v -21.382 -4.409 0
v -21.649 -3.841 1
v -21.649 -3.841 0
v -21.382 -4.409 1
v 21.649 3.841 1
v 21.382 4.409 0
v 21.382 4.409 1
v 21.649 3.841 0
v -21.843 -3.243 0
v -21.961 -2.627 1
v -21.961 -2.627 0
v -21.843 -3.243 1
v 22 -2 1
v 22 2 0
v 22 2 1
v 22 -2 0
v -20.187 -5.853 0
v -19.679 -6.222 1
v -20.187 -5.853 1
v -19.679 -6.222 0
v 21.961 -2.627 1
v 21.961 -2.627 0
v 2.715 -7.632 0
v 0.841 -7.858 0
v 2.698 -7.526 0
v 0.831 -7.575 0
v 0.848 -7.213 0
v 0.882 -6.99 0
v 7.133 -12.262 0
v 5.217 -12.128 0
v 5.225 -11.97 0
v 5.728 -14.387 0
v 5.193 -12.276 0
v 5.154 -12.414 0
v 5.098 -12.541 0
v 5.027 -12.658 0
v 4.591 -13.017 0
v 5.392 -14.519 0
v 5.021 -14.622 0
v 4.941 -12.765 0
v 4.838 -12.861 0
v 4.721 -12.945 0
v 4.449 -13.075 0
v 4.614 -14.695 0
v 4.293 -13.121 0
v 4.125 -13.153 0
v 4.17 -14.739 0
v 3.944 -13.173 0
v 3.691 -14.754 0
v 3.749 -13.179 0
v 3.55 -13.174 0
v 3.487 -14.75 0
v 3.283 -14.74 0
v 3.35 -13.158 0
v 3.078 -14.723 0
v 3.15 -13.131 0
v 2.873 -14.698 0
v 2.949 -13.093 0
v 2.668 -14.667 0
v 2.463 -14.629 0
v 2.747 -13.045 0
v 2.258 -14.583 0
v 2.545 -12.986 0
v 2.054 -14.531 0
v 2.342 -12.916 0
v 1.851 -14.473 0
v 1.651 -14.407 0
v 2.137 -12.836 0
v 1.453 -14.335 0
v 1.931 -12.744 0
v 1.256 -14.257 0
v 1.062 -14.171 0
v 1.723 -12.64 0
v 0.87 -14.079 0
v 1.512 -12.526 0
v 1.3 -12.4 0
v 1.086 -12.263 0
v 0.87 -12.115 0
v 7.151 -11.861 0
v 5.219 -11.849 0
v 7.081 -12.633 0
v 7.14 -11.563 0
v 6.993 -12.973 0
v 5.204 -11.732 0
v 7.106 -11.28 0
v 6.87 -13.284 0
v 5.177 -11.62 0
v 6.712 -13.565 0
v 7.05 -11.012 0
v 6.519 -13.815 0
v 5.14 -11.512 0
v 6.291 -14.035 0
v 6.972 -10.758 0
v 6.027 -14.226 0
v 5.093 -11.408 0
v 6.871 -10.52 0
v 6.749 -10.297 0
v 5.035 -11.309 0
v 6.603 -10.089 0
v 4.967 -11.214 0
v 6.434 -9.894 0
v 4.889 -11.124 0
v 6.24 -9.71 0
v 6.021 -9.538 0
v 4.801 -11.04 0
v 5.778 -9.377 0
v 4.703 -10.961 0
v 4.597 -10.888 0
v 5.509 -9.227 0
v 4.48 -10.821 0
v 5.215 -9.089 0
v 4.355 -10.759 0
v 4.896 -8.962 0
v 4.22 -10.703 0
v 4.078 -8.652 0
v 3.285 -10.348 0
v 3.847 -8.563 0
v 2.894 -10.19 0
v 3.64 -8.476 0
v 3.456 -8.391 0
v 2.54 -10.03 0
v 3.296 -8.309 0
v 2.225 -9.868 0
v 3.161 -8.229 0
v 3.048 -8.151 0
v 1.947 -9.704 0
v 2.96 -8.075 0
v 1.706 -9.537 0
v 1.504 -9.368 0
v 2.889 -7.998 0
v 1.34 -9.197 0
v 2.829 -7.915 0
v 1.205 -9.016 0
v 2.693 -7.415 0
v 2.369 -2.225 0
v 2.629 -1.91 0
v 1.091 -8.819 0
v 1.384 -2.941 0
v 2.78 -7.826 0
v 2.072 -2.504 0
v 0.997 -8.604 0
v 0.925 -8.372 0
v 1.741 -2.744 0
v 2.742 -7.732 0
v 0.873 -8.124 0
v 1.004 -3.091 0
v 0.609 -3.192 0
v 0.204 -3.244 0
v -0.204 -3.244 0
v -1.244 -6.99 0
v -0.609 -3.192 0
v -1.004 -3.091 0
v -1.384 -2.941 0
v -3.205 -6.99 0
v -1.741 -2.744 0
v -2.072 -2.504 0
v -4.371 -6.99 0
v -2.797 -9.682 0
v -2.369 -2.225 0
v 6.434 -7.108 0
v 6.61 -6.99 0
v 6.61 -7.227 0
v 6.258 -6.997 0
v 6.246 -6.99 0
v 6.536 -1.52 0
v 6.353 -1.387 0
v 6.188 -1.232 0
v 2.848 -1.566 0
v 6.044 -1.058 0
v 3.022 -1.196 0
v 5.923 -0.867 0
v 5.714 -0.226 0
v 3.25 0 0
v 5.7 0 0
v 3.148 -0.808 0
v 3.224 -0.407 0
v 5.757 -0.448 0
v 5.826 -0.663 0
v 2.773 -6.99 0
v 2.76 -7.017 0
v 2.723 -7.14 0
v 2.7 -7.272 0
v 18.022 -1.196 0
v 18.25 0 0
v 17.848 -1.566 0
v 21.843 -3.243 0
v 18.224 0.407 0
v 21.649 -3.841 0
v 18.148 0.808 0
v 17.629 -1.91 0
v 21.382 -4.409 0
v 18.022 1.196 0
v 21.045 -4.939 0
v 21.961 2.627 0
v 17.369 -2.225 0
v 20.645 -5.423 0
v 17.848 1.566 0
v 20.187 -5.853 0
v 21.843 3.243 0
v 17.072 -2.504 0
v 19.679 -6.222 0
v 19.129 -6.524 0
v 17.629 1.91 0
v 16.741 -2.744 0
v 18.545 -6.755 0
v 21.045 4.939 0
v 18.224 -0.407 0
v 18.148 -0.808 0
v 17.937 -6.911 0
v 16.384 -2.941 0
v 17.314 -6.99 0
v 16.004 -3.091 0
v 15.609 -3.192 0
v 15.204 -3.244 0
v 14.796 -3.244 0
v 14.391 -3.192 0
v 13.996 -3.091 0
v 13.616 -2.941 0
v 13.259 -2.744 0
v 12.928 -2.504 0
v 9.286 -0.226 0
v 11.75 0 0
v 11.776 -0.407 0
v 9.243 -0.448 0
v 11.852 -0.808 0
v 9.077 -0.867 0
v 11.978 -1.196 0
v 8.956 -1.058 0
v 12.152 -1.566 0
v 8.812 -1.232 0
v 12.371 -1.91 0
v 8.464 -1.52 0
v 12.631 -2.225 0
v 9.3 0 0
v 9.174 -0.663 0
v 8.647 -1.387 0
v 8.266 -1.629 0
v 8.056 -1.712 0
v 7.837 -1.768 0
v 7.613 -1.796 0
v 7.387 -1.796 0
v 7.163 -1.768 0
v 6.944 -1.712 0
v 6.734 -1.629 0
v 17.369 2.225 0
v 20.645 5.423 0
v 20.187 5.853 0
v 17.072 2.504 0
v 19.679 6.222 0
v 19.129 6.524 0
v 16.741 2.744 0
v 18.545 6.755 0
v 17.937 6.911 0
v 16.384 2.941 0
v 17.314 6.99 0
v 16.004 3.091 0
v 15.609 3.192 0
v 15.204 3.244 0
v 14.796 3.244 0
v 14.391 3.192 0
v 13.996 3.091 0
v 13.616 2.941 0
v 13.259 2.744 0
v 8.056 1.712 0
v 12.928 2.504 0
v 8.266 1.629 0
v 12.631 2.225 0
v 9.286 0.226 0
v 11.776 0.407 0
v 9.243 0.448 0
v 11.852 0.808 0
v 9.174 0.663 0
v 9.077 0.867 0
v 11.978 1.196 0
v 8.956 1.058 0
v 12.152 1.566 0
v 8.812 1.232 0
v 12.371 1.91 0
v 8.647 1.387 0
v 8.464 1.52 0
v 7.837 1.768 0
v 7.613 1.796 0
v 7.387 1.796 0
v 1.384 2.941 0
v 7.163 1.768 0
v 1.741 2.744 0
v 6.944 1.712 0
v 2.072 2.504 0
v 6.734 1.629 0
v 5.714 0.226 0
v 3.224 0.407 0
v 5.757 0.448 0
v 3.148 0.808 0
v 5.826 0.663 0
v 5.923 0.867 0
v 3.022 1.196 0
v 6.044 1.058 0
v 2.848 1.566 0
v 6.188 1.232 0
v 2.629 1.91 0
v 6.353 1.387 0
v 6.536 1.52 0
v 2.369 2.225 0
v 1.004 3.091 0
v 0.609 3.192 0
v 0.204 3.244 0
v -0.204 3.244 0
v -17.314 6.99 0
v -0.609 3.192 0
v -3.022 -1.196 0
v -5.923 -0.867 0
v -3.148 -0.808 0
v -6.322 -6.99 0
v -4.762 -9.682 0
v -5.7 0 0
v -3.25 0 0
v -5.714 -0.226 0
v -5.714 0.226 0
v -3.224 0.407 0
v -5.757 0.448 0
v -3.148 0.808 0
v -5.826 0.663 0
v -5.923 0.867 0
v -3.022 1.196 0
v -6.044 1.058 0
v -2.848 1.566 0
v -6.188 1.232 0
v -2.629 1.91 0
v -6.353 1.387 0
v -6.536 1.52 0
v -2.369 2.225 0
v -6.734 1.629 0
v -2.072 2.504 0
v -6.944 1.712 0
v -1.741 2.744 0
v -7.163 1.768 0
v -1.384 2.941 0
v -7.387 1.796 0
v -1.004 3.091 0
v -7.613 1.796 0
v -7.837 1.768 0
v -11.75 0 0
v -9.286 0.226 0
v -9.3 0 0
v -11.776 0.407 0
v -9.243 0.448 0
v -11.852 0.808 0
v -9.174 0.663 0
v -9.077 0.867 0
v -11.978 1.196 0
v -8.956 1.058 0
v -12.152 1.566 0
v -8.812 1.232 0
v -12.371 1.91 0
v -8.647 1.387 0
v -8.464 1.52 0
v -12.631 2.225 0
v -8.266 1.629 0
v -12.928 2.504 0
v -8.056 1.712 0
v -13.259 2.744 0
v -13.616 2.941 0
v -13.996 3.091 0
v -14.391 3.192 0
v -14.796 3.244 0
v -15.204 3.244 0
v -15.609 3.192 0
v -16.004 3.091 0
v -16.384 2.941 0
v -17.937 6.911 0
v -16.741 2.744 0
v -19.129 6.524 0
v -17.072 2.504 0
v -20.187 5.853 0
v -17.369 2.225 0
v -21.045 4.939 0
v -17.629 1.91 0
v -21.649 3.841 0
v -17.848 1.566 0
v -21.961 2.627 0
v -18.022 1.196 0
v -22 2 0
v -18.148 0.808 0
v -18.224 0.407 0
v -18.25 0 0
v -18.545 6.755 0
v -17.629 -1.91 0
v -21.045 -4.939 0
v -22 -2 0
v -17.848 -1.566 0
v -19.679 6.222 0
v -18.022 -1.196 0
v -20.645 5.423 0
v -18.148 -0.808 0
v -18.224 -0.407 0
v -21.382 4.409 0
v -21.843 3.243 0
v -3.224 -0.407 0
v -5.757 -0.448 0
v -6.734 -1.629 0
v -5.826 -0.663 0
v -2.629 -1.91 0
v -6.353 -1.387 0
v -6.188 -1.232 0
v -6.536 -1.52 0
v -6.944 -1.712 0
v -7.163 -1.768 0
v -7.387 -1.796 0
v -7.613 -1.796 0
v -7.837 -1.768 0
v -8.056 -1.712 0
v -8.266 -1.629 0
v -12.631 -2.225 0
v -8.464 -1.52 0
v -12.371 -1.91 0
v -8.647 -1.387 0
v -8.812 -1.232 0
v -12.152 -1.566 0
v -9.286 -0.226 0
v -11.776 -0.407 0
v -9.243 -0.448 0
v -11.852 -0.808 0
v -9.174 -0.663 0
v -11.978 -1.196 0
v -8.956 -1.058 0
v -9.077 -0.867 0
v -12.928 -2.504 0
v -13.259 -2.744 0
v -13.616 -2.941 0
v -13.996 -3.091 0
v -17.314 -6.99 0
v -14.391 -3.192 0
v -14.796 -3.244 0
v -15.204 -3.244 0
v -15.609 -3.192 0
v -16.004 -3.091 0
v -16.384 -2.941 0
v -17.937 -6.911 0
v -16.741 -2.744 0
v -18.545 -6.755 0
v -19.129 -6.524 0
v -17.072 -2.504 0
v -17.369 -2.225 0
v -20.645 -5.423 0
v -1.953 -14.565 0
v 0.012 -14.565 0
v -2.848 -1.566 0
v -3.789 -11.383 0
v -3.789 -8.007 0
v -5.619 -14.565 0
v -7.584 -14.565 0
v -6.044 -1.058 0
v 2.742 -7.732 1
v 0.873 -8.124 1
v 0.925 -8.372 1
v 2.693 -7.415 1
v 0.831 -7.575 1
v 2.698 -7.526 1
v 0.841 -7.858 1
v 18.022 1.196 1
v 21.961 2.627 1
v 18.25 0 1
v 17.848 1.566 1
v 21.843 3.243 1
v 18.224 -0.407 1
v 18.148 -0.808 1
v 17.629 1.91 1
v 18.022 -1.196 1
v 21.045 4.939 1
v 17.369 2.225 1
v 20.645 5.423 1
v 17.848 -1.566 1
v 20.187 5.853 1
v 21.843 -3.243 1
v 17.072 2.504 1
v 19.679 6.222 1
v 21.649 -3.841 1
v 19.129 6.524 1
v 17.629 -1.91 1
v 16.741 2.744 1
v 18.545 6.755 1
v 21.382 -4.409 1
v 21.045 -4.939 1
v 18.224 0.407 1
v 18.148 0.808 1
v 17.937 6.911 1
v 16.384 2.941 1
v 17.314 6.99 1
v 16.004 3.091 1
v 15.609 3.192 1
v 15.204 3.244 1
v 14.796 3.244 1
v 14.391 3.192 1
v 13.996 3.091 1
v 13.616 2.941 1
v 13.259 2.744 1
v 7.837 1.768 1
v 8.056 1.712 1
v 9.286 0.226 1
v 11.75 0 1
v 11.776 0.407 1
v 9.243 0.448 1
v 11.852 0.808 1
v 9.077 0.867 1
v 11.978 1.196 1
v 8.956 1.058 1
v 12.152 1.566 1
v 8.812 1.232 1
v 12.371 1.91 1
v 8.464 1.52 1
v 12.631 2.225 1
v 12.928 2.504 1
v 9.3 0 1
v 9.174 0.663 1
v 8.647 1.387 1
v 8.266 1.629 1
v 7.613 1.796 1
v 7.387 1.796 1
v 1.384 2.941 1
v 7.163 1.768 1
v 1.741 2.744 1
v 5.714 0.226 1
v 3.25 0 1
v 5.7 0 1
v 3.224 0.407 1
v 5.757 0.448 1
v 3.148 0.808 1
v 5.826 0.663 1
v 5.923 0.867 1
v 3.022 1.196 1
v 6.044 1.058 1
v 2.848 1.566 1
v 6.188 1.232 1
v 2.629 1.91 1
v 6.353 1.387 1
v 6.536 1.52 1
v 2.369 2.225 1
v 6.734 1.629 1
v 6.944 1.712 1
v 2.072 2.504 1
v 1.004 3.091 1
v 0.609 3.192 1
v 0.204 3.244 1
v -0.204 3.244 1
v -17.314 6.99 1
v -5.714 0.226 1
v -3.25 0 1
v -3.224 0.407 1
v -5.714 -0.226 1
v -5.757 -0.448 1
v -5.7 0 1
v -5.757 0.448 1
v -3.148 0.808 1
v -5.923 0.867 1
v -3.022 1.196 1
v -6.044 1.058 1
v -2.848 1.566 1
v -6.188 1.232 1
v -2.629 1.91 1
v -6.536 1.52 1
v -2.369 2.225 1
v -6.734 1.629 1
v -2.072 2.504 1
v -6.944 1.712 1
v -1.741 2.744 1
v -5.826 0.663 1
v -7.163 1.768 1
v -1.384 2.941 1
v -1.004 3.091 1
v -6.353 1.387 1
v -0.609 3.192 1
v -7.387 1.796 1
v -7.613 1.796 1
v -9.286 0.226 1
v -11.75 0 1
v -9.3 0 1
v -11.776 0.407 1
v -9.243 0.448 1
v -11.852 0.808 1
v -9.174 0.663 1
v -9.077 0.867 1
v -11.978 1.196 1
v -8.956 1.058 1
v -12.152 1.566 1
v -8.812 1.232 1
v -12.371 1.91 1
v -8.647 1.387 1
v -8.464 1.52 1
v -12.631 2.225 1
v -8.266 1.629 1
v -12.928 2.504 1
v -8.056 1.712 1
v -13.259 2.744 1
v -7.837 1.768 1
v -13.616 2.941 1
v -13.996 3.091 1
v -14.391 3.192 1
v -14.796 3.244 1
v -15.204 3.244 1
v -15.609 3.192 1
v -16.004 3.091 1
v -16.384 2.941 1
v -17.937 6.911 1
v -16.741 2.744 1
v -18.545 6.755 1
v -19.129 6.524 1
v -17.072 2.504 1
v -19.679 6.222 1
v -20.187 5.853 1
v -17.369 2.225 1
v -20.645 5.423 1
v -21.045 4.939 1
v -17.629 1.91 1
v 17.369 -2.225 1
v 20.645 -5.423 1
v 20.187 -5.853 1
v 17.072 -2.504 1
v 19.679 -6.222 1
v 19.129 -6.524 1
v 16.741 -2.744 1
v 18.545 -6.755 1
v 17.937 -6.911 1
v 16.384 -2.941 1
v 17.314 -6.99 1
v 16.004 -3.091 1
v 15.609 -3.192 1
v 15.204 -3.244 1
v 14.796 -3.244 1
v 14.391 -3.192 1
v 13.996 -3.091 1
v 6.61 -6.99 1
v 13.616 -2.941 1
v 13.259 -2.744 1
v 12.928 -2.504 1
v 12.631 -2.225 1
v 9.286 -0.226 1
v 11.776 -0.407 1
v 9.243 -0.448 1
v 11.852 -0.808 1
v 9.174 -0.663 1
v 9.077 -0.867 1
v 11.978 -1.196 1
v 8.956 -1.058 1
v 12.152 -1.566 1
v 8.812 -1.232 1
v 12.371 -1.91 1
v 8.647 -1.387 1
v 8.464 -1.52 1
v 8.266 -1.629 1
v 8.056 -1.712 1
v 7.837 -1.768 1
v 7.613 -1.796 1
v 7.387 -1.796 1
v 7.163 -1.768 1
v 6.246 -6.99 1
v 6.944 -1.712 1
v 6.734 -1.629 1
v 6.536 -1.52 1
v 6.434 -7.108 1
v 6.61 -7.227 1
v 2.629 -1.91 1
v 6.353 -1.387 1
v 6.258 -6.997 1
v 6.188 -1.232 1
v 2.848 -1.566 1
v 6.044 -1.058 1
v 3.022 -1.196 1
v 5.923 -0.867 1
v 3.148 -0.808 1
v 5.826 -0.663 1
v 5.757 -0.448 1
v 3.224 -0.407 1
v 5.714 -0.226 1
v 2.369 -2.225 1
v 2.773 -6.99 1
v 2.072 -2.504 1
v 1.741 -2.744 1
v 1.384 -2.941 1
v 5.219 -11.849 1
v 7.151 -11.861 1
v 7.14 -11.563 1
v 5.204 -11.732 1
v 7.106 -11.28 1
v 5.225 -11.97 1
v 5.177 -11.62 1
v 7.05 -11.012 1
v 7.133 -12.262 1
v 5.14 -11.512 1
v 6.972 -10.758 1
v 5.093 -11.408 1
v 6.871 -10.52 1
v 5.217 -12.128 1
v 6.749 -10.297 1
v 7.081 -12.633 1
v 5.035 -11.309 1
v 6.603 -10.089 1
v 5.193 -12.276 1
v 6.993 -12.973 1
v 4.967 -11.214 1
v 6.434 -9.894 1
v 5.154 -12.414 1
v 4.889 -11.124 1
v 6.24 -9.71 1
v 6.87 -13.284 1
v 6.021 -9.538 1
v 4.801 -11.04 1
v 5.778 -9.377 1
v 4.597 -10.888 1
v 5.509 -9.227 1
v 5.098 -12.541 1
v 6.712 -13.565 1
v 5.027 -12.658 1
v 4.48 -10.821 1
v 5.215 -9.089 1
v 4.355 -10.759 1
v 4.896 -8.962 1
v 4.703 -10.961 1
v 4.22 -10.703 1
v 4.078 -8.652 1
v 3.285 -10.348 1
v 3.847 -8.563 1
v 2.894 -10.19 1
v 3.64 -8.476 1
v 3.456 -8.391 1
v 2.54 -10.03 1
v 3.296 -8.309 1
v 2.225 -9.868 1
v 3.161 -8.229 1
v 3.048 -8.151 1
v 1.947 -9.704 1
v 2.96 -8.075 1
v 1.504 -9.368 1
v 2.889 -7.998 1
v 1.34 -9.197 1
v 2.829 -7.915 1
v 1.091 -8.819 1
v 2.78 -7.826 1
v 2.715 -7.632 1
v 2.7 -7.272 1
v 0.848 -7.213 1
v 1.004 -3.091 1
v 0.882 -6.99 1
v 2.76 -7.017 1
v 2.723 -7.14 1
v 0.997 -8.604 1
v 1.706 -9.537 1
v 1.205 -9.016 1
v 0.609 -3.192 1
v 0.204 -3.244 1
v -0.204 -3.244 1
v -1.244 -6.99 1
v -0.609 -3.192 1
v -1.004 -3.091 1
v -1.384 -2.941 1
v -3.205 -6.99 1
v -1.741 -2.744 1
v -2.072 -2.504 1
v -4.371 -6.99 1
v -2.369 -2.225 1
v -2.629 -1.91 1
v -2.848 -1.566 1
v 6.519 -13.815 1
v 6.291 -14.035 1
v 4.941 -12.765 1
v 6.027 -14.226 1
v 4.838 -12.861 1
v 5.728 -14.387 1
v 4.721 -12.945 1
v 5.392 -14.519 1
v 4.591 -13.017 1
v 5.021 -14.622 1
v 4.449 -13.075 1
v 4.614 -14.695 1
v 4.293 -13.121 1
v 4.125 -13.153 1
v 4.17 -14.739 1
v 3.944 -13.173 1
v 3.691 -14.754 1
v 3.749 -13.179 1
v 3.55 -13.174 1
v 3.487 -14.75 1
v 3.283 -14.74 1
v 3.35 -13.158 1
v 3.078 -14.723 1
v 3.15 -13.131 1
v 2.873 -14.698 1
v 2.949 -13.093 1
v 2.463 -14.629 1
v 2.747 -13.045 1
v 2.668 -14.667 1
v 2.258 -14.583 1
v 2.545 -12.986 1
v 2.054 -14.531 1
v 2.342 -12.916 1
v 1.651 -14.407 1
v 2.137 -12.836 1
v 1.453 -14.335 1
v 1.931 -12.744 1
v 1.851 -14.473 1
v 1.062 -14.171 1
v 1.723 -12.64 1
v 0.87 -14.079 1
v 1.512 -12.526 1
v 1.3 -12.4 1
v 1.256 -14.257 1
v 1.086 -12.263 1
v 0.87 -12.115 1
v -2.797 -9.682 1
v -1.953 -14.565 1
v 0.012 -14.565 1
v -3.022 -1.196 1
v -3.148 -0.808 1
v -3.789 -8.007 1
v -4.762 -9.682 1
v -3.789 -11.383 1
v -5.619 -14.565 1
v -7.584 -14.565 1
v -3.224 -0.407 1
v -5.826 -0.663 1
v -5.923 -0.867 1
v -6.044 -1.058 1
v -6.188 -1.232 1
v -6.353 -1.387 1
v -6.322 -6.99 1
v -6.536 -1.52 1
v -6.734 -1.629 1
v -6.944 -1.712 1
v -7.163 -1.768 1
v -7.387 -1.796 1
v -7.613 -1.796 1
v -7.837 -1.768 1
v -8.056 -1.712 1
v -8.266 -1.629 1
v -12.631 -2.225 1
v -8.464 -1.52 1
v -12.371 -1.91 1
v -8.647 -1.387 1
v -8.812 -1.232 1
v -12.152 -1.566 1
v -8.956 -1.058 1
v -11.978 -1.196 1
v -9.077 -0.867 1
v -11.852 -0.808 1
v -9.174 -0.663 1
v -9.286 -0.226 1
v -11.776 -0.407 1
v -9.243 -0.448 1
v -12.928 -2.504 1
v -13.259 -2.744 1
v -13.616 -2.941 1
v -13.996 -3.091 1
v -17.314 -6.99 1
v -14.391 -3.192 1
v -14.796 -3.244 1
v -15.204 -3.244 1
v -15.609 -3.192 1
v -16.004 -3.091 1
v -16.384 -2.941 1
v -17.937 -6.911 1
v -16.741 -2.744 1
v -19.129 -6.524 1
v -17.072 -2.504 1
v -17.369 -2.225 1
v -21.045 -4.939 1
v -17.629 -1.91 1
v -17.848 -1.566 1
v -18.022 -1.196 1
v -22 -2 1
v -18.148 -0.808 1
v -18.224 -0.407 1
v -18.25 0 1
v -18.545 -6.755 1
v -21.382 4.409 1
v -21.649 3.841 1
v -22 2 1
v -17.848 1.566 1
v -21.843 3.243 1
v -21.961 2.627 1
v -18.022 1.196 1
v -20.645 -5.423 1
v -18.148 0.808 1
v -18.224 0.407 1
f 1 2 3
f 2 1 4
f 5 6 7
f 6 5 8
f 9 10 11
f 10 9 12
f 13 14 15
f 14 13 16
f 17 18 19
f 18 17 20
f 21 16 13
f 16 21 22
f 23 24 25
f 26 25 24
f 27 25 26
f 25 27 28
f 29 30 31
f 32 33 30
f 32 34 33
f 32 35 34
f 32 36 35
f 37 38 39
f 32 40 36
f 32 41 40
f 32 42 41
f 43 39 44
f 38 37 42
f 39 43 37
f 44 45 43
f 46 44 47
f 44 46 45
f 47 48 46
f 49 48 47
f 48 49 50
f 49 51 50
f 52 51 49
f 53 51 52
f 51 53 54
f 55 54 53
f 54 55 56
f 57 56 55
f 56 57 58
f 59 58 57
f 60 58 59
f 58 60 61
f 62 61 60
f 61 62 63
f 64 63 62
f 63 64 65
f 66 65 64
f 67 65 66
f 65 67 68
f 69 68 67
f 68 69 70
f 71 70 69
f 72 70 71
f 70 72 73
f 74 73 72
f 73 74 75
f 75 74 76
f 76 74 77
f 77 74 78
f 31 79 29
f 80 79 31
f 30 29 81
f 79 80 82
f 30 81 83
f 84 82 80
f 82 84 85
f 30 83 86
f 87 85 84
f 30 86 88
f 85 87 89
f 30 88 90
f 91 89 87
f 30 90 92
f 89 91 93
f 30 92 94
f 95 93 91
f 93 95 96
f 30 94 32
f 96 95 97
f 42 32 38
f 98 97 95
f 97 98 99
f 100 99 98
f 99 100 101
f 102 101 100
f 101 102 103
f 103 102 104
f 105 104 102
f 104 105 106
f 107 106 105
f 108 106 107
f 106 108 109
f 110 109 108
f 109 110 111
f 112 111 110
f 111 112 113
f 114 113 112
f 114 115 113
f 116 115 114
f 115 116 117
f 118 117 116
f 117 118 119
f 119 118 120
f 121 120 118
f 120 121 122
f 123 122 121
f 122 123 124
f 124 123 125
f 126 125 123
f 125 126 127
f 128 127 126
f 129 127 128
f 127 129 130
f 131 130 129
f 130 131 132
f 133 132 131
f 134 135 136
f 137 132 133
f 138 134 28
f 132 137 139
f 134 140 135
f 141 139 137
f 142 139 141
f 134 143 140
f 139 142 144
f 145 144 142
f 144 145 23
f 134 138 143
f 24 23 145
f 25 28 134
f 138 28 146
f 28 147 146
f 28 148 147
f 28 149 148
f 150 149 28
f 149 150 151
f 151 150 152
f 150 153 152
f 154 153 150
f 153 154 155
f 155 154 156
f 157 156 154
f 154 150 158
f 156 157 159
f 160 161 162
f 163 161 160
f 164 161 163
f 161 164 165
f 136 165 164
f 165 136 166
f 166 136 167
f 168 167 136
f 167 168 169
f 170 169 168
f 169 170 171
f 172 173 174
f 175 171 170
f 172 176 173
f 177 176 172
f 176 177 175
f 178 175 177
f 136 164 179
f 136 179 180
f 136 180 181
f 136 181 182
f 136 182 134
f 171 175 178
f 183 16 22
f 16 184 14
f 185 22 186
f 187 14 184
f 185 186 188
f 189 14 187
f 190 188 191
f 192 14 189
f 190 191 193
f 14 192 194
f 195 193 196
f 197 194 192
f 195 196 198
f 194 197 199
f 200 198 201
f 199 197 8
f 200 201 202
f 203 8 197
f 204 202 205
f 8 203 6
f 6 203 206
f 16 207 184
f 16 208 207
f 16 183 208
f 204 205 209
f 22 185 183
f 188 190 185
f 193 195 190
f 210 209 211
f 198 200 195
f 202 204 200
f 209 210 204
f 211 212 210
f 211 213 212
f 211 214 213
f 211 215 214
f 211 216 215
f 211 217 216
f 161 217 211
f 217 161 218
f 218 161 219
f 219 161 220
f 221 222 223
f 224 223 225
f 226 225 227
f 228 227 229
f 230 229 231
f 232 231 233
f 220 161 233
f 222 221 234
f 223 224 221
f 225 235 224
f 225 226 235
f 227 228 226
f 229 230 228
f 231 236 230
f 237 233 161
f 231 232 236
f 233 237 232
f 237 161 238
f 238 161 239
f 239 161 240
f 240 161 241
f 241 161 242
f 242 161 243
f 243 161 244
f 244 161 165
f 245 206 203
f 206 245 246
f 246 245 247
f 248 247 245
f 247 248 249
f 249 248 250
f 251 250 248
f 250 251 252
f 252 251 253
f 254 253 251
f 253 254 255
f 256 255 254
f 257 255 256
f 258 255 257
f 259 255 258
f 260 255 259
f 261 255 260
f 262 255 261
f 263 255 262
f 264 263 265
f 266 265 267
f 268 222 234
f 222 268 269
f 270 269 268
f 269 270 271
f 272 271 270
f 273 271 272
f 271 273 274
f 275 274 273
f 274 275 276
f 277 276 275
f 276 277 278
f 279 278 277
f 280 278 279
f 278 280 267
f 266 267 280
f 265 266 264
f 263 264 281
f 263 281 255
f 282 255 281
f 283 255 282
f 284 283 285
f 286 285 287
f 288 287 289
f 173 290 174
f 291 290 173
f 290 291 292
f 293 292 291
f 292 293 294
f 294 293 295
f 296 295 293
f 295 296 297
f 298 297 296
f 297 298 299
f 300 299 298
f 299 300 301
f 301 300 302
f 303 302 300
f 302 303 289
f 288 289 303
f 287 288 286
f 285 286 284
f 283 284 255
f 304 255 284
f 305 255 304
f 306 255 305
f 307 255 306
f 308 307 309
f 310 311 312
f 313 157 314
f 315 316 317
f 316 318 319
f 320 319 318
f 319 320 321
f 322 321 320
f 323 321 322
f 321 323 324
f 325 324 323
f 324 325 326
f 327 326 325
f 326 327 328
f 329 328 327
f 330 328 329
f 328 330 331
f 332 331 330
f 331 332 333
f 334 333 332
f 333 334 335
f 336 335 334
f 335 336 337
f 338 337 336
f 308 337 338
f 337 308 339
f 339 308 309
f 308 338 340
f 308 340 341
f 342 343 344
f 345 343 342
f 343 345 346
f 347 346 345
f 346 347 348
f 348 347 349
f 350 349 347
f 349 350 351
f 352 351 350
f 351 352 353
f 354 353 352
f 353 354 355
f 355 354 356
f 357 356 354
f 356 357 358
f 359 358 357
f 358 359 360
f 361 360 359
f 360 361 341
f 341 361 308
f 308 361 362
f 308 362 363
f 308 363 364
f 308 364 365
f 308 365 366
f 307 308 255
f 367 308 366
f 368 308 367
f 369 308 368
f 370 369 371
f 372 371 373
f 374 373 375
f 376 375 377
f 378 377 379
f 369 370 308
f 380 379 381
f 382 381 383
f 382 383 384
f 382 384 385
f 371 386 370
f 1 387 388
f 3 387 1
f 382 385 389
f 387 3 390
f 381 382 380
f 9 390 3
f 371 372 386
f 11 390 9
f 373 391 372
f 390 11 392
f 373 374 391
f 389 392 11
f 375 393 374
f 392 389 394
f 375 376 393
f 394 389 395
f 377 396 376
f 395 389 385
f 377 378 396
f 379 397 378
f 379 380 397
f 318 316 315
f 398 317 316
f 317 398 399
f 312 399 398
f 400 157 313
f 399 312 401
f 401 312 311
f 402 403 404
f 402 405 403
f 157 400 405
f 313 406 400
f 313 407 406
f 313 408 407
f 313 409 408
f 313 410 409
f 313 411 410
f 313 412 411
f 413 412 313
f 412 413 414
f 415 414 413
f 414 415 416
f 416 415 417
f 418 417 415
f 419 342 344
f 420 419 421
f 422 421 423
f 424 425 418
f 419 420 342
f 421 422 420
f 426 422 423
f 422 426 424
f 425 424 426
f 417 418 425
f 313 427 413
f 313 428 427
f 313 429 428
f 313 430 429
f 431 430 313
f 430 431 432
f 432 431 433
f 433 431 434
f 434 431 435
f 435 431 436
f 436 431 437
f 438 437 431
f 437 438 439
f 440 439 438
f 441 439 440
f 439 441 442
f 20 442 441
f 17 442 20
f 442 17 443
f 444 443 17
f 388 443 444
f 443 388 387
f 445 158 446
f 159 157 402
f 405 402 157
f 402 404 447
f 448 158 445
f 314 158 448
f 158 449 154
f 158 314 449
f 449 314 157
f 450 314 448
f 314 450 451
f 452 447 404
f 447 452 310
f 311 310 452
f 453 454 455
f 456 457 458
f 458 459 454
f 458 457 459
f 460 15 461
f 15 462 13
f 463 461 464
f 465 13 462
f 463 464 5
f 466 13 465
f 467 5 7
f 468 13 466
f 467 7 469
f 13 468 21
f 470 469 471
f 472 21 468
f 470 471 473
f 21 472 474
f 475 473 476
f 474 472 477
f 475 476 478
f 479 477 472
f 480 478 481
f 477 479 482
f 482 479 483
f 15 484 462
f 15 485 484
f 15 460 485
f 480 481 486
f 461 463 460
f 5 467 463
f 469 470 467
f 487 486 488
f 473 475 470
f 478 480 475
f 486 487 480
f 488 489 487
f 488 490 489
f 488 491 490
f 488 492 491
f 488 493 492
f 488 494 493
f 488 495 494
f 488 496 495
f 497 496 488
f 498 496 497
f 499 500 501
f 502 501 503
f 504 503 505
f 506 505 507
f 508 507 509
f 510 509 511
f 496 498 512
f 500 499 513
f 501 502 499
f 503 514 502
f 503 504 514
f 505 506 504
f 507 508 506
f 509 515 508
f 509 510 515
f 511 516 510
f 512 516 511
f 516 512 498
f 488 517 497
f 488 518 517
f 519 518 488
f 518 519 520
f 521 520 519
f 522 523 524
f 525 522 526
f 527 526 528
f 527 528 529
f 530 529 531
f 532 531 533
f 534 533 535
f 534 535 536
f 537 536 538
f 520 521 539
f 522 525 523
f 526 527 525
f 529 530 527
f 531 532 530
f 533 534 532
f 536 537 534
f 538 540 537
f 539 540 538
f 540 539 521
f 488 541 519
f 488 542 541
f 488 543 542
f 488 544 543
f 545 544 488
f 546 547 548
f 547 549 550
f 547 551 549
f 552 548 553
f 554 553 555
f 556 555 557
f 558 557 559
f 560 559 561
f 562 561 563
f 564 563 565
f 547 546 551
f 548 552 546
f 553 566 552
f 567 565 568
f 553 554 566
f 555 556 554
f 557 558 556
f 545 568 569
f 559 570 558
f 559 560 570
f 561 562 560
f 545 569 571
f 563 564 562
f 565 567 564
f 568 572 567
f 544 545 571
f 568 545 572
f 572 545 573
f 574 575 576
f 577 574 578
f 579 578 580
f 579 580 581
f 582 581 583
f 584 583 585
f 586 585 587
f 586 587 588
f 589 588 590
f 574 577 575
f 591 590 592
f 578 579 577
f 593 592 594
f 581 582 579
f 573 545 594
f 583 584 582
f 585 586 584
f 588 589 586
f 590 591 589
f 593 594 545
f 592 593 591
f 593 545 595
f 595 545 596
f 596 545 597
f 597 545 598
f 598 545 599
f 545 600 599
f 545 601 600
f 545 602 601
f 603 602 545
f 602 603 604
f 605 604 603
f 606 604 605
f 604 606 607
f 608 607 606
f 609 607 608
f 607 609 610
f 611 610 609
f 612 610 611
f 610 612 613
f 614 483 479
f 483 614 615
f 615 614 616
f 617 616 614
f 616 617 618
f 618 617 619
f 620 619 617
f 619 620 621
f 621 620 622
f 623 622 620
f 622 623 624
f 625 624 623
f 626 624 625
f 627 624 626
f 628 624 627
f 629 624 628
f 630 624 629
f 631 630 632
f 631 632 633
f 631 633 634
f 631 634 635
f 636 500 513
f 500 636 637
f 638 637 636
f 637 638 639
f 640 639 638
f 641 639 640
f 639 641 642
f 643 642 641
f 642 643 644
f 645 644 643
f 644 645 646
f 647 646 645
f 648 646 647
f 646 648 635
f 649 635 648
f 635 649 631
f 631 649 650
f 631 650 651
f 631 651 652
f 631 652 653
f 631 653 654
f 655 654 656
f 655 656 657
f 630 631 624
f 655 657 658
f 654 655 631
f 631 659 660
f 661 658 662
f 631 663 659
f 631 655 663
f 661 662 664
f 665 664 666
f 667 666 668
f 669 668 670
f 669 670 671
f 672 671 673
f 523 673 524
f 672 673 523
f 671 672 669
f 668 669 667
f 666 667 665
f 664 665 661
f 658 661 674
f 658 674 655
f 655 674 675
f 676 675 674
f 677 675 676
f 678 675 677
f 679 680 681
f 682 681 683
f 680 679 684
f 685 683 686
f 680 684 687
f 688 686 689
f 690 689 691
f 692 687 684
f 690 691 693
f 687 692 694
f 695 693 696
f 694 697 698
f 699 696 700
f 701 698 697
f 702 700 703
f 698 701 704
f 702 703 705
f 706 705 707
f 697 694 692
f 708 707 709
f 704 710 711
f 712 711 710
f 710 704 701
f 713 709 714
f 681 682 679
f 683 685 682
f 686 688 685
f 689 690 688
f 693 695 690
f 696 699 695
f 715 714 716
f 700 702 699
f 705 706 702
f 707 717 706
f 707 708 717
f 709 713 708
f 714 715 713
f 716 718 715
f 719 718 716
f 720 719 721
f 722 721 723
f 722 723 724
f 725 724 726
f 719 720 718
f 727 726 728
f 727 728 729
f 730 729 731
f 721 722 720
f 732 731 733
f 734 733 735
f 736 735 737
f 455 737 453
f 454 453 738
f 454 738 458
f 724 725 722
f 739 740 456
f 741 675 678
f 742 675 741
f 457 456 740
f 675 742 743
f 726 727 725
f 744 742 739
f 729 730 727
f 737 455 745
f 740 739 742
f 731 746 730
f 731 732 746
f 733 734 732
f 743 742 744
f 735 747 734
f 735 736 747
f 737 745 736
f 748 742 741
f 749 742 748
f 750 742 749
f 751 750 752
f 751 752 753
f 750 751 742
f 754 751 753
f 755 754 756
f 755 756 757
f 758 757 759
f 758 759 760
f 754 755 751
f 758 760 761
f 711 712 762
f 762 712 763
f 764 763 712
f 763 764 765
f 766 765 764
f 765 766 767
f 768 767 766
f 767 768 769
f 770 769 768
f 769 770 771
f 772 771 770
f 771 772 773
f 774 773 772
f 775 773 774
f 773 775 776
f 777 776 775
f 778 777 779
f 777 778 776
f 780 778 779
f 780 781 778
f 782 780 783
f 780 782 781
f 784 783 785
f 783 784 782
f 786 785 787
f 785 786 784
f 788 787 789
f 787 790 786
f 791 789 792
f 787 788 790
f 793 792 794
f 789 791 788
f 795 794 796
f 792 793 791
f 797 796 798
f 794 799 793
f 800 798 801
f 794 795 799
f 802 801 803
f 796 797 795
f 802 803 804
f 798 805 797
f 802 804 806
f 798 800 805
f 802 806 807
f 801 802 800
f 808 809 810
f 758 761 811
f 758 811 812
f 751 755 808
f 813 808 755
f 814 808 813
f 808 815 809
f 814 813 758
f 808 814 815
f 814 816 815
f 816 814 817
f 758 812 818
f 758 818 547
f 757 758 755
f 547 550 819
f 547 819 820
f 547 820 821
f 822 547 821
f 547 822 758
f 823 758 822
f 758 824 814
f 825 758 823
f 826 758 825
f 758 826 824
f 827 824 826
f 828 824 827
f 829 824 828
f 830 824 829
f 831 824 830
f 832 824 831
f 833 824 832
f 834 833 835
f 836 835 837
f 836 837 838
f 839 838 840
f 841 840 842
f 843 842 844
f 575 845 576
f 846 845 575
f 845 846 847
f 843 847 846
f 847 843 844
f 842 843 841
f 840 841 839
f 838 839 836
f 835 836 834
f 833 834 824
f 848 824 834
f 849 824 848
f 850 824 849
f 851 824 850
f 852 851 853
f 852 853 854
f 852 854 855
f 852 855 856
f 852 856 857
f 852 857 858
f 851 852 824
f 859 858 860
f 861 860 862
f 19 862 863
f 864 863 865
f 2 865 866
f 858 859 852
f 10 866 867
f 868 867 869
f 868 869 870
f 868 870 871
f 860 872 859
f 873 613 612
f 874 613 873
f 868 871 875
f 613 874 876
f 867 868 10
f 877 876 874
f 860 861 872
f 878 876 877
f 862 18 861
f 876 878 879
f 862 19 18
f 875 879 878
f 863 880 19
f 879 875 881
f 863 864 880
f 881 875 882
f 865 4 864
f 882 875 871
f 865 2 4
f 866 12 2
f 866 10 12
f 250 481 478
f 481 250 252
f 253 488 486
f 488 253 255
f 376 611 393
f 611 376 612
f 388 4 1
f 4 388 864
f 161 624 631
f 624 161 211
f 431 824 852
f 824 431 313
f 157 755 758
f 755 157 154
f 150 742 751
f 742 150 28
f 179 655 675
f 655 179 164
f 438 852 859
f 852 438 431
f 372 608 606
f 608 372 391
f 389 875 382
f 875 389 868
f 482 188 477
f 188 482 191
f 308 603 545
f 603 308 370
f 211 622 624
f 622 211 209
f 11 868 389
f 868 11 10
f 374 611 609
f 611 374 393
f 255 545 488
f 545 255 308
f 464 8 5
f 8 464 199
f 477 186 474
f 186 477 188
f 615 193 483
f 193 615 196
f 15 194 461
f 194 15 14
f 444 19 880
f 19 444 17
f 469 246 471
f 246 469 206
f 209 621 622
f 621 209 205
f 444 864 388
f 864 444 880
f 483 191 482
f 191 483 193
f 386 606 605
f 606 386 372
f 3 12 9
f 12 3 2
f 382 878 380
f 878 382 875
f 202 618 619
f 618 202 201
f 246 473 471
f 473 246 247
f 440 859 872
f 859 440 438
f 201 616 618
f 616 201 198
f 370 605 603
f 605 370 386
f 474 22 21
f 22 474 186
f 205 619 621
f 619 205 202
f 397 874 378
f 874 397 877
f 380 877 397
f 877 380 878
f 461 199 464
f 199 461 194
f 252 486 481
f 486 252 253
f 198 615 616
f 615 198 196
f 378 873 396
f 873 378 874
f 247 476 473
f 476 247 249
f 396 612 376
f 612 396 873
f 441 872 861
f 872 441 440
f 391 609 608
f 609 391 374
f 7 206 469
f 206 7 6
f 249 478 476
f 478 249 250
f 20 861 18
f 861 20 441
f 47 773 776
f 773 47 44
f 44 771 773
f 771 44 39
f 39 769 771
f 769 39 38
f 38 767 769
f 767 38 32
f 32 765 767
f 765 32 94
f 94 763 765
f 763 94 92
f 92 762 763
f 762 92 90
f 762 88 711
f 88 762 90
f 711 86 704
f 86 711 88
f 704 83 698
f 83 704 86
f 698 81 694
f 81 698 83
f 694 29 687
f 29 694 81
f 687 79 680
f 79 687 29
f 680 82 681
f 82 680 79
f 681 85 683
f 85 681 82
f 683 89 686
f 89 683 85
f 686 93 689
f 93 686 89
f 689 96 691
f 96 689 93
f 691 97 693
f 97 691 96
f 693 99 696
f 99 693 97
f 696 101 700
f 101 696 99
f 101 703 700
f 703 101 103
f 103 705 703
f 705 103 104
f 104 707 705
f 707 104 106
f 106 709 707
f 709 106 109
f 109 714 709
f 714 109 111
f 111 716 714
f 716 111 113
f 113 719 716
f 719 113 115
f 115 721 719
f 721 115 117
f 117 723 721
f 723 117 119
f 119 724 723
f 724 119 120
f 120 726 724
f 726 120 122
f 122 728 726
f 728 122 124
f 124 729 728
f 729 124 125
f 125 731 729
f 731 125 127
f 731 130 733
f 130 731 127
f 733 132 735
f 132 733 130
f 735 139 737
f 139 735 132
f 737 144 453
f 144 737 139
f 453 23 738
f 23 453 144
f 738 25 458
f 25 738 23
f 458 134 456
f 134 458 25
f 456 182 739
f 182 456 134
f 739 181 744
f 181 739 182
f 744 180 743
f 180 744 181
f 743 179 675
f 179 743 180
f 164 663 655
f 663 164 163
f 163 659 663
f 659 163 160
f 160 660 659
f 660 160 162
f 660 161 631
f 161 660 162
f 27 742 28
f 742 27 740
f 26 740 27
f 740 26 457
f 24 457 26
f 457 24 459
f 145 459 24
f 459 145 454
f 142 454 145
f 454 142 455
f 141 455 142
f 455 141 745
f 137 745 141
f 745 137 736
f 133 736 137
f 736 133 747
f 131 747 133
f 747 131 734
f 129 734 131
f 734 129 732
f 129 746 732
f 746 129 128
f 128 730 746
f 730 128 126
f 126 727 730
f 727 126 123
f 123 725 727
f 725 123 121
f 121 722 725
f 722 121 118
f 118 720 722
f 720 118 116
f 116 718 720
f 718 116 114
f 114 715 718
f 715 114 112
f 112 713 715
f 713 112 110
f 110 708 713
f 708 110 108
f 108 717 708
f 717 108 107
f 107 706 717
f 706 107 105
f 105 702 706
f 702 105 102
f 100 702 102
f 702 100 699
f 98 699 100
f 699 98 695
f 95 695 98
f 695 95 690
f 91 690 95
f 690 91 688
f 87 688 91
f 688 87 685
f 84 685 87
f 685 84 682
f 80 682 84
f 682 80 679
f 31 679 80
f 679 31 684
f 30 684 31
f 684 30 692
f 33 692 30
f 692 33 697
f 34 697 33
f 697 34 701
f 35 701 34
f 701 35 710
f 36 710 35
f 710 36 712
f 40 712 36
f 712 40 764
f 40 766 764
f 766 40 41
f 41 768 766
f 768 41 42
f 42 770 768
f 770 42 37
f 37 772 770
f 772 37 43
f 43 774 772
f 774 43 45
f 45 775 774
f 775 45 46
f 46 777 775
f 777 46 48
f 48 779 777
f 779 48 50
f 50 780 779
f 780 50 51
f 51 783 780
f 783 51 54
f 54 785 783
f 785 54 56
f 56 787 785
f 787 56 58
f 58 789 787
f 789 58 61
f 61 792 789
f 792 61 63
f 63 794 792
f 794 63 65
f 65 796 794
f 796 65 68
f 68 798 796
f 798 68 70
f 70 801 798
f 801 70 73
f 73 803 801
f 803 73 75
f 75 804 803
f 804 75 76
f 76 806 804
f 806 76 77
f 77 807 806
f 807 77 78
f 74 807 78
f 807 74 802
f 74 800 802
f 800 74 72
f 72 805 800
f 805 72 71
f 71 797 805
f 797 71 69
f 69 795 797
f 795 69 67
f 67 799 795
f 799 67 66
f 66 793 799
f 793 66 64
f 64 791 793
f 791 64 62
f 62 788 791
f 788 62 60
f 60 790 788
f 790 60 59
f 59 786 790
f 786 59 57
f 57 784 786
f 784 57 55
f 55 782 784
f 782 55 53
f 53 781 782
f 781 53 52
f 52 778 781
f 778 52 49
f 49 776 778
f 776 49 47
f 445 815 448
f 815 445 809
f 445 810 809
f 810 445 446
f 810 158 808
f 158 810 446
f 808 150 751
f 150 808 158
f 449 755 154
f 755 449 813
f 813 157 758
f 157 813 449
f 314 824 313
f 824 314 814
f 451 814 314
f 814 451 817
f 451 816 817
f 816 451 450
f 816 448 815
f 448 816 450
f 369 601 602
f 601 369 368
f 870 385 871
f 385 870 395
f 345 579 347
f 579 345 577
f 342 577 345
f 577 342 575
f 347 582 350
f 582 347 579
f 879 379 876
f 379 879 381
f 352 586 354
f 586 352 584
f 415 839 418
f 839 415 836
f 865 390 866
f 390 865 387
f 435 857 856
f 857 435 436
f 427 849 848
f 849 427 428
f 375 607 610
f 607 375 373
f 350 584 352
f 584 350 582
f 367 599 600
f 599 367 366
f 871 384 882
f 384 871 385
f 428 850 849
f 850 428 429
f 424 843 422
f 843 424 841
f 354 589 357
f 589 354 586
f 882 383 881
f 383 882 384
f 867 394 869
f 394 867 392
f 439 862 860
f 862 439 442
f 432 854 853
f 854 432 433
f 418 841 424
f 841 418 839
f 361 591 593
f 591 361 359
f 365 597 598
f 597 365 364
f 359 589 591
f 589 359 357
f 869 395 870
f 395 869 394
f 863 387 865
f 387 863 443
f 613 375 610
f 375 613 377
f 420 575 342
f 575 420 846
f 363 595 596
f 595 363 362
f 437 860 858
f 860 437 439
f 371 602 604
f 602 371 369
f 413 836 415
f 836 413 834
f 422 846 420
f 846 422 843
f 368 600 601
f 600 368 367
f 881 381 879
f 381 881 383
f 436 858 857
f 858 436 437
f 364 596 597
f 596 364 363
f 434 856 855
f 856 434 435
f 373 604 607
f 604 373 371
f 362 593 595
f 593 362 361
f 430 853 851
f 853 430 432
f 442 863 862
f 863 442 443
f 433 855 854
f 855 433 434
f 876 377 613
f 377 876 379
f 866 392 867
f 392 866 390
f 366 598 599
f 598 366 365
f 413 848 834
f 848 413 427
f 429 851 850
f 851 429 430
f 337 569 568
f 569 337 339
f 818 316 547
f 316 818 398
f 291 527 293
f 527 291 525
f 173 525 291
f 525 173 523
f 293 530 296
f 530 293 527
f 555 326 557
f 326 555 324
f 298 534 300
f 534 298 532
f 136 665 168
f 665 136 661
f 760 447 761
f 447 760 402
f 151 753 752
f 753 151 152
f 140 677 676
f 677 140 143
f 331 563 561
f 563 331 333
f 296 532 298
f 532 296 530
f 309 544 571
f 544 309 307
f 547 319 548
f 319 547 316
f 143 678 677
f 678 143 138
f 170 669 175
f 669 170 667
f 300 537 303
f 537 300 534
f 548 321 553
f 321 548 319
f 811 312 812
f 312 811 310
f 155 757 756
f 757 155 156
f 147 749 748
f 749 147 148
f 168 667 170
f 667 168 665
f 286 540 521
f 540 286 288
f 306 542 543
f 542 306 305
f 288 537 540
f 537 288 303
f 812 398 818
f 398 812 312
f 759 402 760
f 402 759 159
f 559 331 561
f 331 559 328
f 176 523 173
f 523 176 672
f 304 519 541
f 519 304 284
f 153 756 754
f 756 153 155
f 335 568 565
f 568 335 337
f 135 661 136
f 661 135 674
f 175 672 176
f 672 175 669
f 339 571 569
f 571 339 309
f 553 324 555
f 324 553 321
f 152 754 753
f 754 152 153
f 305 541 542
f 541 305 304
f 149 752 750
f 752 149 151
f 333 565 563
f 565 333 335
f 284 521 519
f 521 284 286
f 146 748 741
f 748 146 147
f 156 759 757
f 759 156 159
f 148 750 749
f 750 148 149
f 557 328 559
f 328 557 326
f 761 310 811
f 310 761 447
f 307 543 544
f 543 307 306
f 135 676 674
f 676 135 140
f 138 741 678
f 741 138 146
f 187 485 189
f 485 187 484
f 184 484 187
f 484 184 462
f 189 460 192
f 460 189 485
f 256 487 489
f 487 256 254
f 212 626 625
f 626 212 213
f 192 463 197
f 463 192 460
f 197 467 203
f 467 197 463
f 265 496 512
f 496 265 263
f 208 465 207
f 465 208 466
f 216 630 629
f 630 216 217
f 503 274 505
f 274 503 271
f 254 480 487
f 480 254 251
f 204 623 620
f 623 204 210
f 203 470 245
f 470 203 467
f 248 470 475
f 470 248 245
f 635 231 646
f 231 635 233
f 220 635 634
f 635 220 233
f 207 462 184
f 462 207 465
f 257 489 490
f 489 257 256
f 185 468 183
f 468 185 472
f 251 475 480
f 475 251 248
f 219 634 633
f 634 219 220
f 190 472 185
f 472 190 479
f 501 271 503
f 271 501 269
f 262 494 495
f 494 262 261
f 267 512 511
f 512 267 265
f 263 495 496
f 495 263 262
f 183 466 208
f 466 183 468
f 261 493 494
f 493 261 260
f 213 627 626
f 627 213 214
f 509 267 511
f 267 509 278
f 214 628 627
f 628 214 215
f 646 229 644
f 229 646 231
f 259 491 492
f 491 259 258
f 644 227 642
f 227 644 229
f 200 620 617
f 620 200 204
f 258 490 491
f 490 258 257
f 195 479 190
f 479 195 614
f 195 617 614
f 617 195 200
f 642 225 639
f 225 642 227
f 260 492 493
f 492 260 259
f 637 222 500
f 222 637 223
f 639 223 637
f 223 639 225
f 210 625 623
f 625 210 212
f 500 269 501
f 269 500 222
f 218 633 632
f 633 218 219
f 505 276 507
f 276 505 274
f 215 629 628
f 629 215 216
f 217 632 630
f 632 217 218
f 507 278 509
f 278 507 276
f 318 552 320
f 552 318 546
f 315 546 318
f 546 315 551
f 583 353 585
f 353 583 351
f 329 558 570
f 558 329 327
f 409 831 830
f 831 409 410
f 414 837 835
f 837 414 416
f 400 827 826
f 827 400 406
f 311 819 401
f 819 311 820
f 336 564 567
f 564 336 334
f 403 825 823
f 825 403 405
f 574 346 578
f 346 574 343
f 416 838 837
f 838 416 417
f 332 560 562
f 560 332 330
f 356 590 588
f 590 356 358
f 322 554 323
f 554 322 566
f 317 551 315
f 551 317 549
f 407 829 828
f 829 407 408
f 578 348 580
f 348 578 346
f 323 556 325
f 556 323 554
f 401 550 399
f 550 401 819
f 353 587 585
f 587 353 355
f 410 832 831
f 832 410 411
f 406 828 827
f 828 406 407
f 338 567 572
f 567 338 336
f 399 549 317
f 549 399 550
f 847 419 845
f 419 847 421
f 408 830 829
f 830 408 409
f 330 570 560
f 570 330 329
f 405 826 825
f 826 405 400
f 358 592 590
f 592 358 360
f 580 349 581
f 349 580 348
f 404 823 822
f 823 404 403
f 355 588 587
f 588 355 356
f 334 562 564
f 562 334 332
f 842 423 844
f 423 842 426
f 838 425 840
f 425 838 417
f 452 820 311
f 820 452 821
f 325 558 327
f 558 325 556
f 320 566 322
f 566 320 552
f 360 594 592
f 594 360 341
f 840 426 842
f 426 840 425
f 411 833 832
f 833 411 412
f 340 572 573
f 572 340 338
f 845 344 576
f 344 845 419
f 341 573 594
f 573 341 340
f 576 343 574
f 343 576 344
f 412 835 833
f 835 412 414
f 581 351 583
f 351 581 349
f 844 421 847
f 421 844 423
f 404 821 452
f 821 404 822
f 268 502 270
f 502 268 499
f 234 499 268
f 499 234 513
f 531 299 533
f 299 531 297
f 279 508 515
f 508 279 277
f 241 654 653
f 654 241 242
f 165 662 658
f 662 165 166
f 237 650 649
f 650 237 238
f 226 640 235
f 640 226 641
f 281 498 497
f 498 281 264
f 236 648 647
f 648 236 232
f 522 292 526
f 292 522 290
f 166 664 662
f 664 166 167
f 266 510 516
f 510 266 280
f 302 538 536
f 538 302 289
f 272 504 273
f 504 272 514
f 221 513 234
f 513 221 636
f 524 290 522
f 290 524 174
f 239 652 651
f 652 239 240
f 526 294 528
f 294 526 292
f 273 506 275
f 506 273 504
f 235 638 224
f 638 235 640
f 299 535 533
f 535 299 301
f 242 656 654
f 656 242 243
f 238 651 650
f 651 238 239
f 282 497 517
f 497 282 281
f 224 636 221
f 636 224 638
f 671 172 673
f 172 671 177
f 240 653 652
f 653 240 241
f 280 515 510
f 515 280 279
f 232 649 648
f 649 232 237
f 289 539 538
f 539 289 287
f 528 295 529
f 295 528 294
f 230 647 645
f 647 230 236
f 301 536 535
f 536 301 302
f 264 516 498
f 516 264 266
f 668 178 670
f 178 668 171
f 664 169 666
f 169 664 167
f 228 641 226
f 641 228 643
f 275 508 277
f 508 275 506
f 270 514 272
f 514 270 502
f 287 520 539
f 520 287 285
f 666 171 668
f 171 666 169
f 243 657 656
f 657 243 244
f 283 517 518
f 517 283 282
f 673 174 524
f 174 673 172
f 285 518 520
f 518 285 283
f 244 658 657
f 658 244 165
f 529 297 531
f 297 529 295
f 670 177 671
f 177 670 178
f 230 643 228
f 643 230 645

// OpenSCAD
$fn = 50;


difference() {
	union() {
		hull() {
			translate(v = [-17.0000000000, 2.0000000000, 0]) {
				cylinder(h = 1, r = 5);
			}
			translate(v = [17.0000000000, 2.0000000000, 0]) {
				cylinder(h = 1, r = 5);
			}
			translate(v = [-17.0000000000, -2.0000000000, 0]) {
				cylinder(h = 1, r = 5);
			}
			translate(v = [17.0000000000, -2.0000000000, 0]) {
				cylinder(h = 1, r = 5);
			}
		}
		translate(v = [0, -5, 0]) {
			linear_extrude(height = 1) {
				text(font = "DejaVu Sans Mono:style=Bold", halign = "center", size = 9.5000000000, text = "XS", valign = "top");
			}
		}
	}
	union() {
		translate(v = [-15.0000000000, 0.0000000000, 0]) {
			translate(v = [0, 0, -100]) {
				cylinder(h = 200, r = 3.2500000000);
			}
		}
		translate(v = [0, 0, -100]) {
			cylinder(h = 200, r = 3.2500000000);
		}
		translate(v = [15.0000000000, 0.0000000000, 0]) {
			translate(v = [0, 0, -100]) {
				cylinder(h = 200, r = 3.2500000000);
			}
		}
		translate(v = [-15.0000000000, 0.0000000000, 0]) {
			translate(v = [0, 0, -100]) {
				cylinder(h = 200, r = 1.8000000000);
			}
		}
		translate(v = [-7.5000000000, 0.0000000000, 0]) {
			translate(v = [0, 0, -100]) {
				cylinder(h = 200, r = 1.8000000000);
			}
		}
		translate(v = [0, 0, -100]) {
			cylinder(h = 200, r = 1.8000000000);
		}
		translate(v = [7.5000000000, 0.0000000000, 0]) {
			translate(v = [0, 0, -100]) {
				cylinder(h = 200, r = 1.8000000000);
			}
		}
		translate(v = [15.0000000000, 0.0000000000, 0]) {
			translate(v = [0, 0, -100]) {
				cylinder(h = 200, r = 1.8000000000);
			}
		}
	}
}
